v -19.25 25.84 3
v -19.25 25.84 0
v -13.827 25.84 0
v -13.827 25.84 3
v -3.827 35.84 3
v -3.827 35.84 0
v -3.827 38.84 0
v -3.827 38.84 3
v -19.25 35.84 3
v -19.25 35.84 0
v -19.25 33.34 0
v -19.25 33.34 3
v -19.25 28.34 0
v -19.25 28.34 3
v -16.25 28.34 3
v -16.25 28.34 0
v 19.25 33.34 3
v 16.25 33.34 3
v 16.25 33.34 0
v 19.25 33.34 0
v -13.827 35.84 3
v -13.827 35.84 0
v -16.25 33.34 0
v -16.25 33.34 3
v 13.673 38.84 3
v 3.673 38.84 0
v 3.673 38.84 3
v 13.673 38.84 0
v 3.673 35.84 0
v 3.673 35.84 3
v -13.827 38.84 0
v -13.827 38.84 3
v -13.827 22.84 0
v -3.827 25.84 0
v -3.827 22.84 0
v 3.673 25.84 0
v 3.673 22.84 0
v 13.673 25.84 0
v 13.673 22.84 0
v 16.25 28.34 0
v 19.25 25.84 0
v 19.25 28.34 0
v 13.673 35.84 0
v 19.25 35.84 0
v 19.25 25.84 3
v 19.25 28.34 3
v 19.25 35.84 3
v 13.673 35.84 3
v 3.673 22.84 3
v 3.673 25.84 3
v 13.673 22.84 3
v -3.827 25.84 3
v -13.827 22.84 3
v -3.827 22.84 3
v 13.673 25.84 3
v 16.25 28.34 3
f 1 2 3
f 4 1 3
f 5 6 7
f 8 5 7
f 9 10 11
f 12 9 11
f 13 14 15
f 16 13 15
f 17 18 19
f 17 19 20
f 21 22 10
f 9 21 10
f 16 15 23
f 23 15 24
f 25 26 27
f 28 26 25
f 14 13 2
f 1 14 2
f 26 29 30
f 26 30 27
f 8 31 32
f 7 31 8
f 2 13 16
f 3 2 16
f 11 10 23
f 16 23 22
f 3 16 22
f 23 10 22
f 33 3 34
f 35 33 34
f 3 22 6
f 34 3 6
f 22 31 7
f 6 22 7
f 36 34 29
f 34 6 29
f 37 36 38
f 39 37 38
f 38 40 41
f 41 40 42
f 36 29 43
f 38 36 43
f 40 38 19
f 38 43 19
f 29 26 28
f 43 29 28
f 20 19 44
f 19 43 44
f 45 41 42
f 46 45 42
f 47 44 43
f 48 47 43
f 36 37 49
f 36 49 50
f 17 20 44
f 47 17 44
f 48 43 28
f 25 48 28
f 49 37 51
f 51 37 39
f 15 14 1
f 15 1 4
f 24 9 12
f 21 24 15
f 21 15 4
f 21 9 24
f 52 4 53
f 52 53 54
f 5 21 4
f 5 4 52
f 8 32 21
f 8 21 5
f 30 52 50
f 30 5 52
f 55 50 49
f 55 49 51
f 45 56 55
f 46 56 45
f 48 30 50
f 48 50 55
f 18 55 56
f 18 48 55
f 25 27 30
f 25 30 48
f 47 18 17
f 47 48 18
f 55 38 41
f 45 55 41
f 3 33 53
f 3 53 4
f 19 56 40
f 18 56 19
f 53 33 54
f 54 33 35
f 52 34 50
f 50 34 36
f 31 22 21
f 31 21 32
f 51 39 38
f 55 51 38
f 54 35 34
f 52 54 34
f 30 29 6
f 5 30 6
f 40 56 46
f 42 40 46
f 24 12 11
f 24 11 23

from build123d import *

# Parameters (mm, degrees)
SKETCH1_W           = 10
SKETCH1_H           = 3
BOSS_EXTRUDE1_DEPTH = 3
SKETCH2_W           = 3
SKETCH2_H           = 5
CUT_EXTRUDE1_DEPTH  = 3


with BuildPart() as part:
    # Sketch1 → Boss-Extrude1 (new body)
    with BuildSketch(Plane.XY):
        Polygon((-3.827421787, 35.839698152), (-13.827421787, 35.839698152), (-16.25, 35.839698152), (-19.25, 35.839698152), (-19.25, 25.839698152), (-13.827421787, 25.839698152), (-3.827421787, 25.839698152), (3.672578213, 25.839698152), (13.672578213, 25.839698152), (19.25, 25.839698152), (19.25, 35.839698152), (16.25, 35.839698152), (13.672578213, 35.839698152), (3.672578213, 35.839698152), align=None)
        with Locations((-8.827421787, 37.339698152)):
            Rectangle(SKETCH1_W, SKETCH1_H)
        with Locations((8.672578213, 37.339698152)):
            Rectangle(SKETCH1_W, SKETCH1_H)
        with Locations((-8.827421787, 24.339698152)):
            Rectangle(SKETCH1_W, SKETCH1_H)
        with Locations((8.672578213, 24.339698152)):
            Rectangle(SKETCH1_W, SKETCH1_H)
    extrude(amount=BOSS_EXTRUDE1_DEPTH)

    # Sketch2 → Cut-Extrude1 (cut)
    with BuildSketch(Plane.XY.offset(3)):
        with Locations((-17.75, 30.839698152)):
            Rectangle(SKETCH2_W, SKETCH2_H)
        with Locations((17.75, 30.839698152)):
            Rectangle(SKETCH2_W, SKETCH2_H)
    extrude(amount=-CUT_EXTRUDE1_DEPTH, mode=Mode.SUBTRACT)


solid = part.part
